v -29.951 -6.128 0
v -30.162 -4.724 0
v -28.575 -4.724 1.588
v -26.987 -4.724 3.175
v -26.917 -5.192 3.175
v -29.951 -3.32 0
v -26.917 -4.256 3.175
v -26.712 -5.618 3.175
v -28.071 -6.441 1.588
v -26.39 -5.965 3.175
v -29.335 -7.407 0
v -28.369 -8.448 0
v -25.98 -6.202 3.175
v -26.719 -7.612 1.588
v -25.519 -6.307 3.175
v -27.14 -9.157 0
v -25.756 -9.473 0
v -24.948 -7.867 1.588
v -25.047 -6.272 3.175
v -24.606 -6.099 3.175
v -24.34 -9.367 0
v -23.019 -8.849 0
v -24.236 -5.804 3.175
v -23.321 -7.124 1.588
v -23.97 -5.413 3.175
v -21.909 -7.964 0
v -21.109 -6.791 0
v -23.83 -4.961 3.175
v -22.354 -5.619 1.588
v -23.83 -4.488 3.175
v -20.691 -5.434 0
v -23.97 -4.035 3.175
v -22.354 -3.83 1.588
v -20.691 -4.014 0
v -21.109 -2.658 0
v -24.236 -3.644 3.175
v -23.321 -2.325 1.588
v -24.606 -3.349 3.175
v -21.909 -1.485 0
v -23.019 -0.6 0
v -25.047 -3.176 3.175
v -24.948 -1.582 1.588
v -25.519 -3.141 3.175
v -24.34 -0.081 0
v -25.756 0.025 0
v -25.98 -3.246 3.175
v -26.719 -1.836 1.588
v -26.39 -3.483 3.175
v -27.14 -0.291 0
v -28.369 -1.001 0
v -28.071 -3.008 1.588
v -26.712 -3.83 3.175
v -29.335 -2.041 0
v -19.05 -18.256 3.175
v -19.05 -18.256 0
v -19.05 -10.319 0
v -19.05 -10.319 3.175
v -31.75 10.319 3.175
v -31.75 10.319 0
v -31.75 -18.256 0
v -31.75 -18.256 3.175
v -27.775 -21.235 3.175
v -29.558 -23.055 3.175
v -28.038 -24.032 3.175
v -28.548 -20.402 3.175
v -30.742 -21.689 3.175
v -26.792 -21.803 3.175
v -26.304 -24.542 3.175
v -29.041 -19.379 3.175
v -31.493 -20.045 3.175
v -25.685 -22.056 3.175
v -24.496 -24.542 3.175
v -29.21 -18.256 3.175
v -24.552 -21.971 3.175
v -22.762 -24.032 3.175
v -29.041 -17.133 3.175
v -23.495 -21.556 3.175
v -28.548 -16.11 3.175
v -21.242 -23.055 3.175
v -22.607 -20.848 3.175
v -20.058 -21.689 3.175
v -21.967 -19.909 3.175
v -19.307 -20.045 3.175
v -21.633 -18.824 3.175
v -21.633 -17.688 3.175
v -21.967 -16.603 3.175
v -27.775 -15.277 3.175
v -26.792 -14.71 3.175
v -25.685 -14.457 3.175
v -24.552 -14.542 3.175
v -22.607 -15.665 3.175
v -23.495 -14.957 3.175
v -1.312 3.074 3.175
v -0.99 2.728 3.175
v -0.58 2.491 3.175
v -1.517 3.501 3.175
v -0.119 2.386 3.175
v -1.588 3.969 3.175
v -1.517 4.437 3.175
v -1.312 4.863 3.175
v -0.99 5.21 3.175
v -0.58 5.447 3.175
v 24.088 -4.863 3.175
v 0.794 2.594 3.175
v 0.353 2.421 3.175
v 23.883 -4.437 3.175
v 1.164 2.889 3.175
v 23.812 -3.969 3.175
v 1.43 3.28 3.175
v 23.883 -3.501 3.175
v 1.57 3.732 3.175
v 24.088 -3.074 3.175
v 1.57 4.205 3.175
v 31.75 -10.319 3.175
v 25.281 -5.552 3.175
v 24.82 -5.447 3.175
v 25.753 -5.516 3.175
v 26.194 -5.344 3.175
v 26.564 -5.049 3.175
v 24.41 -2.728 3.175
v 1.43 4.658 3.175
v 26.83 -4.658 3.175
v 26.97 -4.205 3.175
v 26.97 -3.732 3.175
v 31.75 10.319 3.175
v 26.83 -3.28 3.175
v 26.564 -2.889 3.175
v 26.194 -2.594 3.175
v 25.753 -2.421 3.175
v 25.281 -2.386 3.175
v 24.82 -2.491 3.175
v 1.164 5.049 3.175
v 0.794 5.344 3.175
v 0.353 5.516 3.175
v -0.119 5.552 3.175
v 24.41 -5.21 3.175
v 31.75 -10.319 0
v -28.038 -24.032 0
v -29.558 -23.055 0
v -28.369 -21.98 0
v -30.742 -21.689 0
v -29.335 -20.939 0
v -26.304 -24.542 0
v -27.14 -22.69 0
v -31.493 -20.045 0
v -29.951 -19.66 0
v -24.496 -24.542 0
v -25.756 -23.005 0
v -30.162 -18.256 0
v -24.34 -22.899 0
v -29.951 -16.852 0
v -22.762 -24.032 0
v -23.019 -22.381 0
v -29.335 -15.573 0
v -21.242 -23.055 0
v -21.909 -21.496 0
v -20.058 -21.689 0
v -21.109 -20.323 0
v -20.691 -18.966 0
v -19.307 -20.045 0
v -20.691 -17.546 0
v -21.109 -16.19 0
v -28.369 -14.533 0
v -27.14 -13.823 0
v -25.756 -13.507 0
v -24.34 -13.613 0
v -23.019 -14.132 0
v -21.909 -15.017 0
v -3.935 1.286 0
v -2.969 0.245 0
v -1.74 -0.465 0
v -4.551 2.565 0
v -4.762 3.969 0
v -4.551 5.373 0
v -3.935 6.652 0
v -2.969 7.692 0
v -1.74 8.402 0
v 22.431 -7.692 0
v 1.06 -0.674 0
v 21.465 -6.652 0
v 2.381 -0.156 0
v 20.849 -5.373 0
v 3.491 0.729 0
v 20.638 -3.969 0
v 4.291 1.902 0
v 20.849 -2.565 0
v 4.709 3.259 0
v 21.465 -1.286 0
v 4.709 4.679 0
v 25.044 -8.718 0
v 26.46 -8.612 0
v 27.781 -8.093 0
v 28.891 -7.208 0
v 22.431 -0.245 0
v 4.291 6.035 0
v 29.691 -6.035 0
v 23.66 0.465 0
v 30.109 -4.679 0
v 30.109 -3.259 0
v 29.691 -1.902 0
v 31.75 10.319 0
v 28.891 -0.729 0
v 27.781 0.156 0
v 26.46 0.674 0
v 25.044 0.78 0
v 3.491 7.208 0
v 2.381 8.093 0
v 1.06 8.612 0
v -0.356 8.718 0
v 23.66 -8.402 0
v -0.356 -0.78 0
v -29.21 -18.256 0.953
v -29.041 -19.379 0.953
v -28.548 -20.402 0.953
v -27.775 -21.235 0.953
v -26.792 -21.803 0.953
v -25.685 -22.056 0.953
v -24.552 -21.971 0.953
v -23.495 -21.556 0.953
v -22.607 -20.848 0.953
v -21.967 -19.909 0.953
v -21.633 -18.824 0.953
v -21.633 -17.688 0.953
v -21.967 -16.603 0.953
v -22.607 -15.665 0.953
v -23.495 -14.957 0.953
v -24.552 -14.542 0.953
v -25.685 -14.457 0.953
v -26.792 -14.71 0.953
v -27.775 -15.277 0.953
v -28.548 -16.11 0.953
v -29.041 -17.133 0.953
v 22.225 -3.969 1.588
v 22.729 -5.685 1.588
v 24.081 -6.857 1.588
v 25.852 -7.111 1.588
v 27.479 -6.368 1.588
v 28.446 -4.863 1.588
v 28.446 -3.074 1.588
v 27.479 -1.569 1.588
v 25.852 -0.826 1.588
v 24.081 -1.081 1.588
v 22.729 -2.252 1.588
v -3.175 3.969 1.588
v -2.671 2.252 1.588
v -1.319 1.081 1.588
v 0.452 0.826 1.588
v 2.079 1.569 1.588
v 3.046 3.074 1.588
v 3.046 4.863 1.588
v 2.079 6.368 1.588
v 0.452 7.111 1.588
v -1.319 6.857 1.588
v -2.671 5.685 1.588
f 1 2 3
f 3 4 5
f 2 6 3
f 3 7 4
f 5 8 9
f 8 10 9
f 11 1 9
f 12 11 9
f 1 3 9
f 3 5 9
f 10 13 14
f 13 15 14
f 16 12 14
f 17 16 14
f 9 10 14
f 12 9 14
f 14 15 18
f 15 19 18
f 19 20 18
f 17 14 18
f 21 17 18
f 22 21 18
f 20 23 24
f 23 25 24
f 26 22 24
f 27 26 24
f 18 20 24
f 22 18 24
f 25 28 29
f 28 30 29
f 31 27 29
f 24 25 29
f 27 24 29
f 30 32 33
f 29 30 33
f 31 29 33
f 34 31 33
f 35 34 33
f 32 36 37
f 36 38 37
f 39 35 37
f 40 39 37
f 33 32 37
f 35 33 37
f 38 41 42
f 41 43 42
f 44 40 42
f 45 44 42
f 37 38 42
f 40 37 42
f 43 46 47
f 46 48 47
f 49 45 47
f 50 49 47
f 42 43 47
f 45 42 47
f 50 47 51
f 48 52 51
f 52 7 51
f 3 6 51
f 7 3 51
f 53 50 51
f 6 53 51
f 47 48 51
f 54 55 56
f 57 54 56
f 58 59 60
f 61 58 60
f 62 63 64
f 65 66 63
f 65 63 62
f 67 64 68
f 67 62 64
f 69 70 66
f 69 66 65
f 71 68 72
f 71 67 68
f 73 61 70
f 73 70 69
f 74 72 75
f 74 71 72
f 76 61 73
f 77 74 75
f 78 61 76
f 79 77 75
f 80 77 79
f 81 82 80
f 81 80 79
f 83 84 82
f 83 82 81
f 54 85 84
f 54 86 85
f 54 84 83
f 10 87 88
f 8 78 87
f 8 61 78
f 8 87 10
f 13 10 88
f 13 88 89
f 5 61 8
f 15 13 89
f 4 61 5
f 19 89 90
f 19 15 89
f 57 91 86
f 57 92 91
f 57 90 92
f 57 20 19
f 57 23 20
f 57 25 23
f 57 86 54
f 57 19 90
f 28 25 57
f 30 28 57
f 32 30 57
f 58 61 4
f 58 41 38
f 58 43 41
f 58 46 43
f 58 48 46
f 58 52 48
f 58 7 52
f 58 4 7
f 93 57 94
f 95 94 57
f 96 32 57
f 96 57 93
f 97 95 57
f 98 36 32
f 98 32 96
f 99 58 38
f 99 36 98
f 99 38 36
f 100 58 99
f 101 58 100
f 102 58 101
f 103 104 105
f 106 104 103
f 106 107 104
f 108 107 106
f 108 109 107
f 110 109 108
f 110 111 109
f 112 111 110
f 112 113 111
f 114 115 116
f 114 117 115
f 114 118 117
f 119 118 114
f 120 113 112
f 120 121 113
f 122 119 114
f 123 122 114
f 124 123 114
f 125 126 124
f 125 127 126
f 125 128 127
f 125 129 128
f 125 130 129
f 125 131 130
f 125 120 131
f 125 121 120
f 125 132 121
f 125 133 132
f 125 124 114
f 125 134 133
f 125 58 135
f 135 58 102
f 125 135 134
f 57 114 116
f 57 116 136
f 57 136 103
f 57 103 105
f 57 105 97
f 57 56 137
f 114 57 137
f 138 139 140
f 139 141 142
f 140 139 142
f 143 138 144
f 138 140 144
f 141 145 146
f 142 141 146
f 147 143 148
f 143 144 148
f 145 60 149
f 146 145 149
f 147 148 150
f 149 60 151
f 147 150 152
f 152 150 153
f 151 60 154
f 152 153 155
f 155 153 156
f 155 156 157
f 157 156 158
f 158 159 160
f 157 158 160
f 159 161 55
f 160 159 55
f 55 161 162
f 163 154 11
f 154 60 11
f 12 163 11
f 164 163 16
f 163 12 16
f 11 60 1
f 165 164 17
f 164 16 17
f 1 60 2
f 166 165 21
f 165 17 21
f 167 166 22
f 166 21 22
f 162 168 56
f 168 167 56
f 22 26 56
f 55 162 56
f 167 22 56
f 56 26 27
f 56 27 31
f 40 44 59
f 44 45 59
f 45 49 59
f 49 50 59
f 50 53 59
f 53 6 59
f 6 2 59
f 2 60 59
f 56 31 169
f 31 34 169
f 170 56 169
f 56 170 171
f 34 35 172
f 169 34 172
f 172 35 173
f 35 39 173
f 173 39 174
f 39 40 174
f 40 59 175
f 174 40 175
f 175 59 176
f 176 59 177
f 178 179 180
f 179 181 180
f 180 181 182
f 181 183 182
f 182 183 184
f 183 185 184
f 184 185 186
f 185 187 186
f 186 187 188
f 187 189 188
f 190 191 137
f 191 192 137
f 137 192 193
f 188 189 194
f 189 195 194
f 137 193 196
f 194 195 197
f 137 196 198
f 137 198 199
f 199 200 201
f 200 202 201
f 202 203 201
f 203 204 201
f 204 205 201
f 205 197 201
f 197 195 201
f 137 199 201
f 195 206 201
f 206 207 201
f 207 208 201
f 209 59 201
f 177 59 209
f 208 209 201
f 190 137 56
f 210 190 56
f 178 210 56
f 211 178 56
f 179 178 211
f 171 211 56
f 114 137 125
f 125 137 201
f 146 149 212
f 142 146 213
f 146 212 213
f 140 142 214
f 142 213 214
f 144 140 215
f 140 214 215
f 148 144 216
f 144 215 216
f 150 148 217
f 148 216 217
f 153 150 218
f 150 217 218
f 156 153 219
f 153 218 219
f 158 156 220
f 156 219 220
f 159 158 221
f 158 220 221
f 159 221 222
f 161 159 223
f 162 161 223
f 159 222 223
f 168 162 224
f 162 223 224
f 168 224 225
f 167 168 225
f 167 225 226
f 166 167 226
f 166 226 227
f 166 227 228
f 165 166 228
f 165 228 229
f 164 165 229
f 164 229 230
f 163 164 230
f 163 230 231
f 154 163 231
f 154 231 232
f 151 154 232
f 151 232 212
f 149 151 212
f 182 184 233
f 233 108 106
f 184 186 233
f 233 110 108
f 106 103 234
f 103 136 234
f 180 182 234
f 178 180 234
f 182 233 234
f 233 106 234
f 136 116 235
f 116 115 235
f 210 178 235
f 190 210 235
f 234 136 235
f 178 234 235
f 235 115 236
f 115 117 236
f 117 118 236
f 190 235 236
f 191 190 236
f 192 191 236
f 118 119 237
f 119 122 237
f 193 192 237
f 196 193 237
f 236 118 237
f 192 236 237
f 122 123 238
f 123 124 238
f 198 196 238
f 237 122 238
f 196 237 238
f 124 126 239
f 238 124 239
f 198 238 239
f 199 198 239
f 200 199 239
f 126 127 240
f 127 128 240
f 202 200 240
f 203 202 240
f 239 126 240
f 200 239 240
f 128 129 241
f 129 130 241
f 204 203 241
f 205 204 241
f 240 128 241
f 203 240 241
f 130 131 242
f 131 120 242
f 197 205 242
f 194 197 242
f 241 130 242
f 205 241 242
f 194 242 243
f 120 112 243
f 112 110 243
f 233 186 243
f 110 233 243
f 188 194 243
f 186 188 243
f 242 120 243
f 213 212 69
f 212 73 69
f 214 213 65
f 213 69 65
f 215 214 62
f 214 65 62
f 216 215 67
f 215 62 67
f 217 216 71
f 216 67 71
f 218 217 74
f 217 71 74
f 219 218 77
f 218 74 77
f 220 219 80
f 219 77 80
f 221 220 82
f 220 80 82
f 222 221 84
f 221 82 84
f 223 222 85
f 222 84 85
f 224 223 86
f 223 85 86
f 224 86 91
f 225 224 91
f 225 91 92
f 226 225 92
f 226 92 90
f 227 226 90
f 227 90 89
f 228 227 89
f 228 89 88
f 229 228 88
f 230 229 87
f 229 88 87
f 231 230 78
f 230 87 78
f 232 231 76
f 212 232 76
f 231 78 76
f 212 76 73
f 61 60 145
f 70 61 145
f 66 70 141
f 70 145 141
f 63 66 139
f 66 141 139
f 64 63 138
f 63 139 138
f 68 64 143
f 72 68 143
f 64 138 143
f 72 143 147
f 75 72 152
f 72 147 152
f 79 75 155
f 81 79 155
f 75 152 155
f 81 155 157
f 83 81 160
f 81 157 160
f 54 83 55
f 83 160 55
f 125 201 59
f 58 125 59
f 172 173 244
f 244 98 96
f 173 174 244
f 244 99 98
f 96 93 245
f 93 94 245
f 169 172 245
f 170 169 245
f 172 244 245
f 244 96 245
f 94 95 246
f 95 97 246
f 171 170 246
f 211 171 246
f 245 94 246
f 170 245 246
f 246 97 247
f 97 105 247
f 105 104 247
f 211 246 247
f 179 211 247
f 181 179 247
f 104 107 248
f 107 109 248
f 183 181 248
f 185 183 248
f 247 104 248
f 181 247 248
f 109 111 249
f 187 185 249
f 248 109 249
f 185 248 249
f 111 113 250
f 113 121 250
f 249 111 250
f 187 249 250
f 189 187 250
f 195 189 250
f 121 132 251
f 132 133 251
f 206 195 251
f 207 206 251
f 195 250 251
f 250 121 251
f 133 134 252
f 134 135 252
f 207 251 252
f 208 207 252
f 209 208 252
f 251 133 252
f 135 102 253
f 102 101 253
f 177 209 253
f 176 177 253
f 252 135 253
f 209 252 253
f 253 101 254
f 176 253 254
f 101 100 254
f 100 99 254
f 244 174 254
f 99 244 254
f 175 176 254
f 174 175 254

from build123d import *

# Parameters (mm, degrees)
F1_DEPTH       = 3.175
F2_D           = 2.54
F2_CSINK_D     = 9.525
F2_CSINK_ANGLE = 90
F3_D           = 7.62
F3_CSINK_D     = 9.525
F3_CSINK_ANGLE = 90


with BuildPart() as f1:
    # F0 (on Top) → F1 (new body)
    with BuildSketch(Plane.XY):
        with BuildLine():
            Line((31.75, -10.31875), (31.75, 10.31875))
            Line((31.75, 10.31875), (-31.75, 10.31875))
            Line((-31.75, 10.31875), (-31.75, -18.25625))
            ThreePointArc((-31.75, -18.25625), (-25.4, -24.60625), (-19.05, -18.25625))
            Line((-19.05, -18.25625), (-19.05, -10.31875))
            Line((-19.05, -10.31875), (31.75, -10.31875))
        make_face()
    extrude(amount=F1_DEPTH)

    # F2 (through all)
    with Locations(Plane(origin=(0, 0, 0), x_dir=(1, 0, 0), z_dir=(0, 0, -1))):
        with Locations((25.4, 3.96875), (0, -3.96875), (-25.4, 4.7241849825)):
            CounterSinkHole(F2_D / 2, F2_CSINK_D / 2, counter_sink_angle=F2_CSINK_ANGLE)

    # F3 (through all)
    with Locations(Plane(origin=(0, 0, 0), x_dir=(1, 0, 0), z_dir=(0, 0, -1))):
        with Locations((-25.4, 18.25625)):
            CounterSinkHole(F3_D / 2, F3_CSINK_D / 2, counter_sink_angle=F3_CSINK_ANGLE)


solid = f1.part
